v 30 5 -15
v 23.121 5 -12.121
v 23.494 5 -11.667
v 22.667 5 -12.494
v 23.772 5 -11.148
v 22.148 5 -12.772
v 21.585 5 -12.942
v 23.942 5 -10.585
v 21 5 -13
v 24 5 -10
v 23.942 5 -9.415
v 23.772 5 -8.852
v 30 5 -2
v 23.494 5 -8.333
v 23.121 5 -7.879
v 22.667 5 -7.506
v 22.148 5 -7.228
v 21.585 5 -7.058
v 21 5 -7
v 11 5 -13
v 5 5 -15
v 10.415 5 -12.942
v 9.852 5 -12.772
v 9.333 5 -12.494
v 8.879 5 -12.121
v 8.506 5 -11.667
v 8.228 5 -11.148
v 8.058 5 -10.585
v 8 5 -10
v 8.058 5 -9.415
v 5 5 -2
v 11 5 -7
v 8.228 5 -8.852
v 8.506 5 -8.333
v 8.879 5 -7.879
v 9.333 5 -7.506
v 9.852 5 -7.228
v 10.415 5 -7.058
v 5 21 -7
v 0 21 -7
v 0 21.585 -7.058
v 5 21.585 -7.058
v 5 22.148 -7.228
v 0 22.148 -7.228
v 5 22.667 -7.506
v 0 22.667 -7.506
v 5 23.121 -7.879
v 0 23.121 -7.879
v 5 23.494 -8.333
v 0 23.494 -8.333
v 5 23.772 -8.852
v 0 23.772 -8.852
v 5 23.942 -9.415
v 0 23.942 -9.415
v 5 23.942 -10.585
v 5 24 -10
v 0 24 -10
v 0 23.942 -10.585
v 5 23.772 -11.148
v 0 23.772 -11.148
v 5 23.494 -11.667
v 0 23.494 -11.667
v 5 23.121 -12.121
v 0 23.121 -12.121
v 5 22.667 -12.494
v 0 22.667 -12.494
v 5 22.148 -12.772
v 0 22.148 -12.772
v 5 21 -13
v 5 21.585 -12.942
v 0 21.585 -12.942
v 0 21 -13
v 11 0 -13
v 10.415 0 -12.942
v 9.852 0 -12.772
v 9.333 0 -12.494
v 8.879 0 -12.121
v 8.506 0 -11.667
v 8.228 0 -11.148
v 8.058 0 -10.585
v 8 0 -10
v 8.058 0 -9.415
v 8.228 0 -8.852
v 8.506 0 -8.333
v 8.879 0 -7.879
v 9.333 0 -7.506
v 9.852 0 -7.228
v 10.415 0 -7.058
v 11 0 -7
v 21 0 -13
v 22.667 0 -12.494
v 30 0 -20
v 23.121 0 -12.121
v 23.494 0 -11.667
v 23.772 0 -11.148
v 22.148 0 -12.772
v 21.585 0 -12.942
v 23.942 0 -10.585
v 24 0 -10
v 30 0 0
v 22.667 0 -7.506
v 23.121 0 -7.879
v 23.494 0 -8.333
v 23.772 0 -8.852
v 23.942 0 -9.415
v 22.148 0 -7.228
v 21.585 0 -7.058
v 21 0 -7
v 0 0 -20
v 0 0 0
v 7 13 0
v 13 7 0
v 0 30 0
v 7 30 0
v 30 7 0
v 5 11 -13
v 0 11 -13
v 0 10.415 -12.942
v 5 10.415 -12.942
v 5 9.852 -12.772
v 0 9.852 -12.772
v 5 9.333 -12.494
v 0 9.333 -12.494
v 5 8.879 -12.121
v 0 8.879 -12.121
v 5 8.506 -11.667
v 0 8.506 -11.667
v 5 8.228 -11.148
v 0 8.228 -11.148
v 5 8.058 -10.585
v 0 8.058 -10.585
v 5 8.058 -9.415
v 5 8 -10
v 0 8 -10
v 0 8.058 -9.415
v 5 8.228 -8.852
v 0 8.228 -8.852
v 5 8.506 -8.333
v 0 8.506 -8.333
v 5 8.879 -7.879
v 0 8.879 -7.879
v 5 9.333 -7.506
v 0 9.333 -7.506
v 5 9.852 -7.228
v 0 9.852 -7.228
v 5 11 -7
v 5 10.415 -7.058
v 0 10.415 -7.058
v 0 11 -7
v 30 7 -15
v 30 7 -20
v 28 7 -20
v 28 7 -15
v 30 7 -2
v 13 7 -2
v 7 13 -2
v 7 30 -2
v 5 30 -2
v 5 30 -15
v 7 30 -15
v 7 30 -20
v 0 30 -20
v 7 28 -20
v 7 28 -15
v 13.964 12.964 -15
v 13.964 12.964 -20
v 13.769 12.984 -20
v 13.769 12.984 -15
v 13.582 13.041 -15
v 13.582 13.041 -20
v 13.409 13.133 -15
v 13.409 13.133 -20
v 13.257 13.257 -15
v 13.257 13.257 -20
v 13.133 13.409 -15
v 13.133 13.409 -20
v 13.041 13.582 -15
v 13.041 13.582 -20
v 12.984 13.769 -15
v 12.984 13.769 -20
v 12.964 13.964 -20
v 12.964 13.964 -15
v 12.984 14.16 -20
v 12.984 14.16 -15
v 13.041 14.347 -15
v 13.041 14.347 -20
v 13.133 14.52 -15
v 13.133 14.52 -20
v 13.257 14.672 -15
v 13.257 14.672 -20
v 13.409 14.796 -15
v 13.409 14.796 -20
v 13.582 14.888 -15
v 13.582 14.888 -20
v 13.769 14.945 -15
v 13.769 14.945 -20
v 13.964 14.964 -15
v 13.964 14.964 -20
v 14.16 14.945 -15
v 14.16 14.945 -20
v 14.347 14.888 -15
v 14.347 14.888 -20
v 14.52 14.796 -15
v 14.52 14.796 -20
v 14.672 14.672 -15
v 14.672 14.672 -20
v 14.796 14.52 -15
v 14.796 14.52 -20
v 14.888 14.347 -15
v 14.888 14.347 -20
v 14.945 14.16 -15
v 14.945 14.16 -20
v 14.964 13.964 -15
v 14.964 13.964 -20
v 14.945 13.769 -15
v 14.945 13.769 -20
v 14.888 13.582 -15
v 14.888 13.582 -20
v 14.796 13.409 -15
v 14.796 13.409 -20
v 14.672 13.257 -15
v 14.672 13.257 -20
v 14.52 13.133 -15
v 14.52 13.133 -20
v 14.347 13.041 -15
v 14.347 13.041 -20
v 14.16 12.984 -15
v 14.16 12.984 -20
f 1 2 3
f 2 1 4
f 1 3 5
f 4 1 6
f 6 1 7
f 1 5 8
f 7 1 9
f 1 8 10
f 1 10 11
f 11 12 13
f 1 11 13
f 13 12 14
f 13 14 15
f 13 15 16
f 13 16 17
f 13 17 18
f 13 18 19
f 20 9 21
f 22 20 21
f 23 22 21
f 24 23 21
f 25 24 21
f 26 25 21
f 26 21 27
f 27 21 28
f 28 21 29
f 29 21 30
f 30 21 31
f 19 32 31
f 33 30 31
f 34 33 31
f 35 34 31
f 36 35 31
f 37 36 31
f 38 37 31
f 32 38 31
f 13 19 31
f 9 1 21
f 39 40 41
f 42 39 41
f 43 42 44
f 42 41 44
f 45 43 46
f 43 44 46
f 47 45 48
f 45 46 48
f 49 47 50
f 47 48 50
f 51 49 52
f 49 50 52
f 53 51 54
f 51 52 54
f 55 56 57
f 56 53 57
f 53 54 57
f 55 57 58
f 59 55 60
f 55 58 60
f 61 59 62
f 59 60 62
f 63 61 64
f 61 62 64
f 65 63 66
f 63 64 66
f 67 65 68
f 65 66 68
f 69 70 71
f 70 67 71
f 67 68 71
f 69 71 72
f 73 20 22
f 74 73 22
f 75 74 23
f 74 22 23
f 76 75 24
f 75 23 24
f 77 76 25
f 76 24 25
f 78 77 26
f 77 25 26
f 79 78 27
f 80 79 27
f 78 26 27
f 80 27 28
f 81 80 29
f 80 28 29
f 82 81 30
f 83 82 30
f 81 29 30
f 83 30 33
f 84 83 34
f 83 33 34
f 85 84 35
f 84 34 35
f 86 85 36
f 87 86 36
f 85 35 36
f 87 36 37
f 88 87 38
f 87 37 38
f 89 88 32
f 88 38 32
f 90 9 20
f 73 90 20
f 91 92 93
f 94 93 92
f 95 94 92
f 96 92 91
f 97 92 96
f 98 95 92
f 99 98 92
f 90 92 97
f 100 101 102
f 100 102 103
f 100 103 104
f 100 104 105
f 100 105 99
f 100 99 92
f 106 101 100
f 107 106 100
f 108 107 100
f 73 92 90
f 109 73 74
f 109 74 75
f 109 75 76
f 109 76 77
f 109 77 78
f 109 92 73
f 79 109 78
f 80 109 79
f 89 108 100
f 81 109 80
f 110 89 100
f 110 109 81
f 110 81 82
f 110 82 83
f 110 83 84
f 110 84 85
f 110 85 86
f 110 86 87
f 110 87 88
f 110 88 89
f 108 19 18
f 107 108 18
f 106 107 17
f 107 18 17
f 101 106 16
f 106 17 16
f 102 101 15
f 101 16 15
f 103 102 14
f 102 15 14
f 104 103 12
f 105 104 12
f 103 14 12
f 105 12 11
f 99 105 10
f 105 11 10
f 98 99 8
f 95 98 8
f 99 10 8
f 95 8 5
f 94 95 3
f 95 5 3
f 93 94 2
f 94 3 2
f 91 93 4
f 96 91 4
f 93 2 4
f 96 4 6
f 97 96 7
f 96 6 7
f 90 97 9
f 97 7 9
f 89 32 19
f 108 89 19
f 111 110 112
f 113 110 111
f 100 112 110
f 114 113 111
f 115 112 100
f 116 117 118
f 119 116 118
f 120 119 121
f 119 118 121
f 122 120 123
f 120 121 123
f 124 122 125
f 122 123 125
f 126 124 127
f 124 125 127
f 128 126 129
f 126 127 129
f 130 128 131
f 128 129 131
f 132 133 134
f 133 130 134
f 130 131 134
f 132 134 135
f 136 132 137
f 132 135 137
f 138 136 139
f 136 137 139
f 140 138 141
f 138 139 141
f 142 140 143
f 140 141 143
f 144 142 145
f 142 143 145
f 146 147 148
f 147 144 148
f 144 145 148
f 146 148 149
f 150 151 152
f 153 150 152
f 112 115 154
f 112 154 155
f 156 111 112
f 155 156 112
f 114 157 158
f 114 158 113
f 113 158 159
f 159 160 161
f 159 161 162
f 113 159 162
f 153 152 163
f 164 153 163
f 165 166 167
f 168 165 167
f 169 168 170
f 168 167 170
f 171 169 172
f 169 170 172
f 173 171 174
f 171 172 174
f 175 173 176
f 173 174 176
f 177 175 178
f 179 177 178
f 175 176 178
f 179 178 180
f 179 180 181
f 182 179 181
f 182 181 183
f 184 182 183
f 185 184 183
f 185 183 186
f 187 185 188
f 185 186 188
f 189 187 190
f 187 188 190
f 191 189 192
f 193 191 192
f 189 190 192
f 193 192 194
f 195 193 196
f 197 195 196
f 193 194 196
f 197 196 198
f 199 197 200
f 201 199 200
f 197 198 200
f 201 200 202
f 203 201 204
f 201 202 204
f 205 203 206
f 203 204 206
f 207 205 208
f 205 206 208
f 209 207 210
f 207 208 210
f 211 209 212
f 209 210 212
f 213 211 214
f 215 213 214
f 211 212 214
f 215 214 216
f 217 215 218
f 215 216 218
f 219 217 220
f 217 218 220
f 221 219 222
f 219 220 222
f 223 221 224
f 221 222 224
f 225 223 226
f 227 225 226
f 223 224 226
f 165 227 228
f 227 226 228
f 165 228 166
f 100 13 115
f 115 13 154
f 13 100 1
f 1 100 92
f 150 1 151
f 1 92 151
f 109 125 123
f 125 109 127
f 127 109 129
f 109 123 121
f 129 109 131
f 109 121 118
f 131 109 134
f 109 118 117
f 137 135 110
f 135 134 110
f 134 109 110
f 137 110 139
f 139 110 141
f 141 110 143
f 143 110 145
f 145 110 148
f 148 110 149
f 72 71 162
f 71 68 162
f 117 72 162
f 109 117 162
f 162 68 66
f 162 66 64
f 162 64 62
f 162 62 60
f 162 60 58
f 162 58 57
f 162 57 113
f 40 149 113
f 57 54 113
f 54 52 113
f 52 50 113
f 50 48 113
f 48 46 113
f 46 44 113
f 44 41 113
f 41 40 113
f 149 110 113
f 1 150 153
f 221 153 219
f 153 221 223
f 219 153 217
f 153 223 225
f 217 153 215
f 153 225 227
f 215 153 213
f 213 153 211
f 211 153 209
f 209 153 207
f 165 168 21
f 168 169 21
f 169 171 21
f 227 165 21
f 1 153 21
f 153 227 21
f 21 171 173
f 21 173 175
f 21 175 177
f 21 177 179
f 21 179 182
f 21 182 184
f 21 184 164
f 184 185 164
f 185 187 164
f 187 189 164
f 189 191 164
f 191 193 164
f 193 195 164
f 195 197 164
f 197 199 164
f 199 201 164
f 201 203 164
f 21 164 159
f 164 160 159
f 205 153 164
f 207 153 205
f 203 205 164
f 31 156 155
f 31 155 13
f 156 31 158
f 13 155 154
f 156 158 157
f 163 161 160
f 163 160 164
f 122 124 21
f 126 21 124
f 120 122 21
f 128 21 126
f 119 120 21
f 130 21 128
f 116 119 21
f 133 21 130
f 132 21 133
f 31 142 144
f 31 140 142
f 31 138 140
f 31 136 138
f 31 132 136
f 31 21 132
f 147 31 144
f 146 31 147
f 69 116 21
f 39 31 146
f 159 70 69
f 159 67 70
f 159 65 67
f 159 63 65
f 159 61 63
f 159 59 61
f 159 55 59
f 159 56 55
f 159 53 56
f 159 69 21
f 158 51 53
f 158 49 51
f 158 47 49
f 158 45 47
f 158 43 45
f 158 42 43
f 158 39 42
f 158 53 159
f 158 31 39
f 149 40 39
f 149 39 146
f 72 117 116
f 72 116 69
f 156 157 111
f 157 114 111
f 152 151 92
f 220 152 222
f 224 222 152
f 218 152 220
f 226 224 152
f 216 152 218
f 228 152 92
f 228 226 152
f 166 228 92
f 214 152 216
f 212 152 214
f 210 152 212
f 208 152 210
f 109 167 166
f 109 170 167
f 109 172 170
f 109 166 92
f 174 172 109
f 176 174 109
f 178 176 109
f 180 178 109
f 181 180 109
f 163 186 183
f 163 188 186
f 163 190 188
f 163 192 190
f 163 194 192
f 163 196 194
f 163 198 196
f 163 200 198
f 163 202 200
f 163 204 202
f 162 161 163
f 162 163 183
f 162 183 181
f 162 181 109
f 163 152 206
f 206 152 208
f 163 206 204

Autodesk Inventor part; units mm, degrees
ref_plane "YZ Plane" through (0, 0, 0) normal (1, 0, 0) x (0, 1, 0)
ref_plane "XZ Plane" through (0, 0, 0) normal (0, 1, 0) x (-1, 0, 0)
ref_plane "XY Plane" through (0, 0, 0) normal (0, 0, 1) x (1, 0, 0)
sketch "Boceto1" plane through (0, 0, 0) normal (1, 0, 0) x (0, 1, 0)
  line L0 (0, 0) -> (30, 0)
  line L1 (30, 0) -> (30, -20)
  line L2 (30, -20) -> (0, -20)
  line L3 (0, -20) -> (0, 0)
  line L4 (21, -10) -> (11, -10) construction
  line L5 (21, -7) -> (11, -7)
  line L6 (11, -13) -> (21, -13)
  arc A0 (21, -13) -> (21, -7) centre (21, -10) ccw
  arc A1 (11, -7) -> (11, -13) centre (11, -10) ccw
  point P0 (16, -10)
  point P1 (24, -10)
  point P2 (30, -10)
  point P3 (0, -10)
  point P4 (8, -10)
  dimension "d0" = 30
  dimension "d1" = 20
  dimension "d2" = 10
  dimension "d3" = 6
  dimension "d4" = 6
extrude "Extrusión1" add sketch "Boceto1" along normal blind 5
sketch "Boceto2" plane through (5, 0, 0) normal (1, 0, 0) x (0, 0, -1)
  line L0 (0, 0) -> (20, 0) projected
  line L1 (0, 0) -> (20, 0)
  line L2 (20, 0) -> (20, 5)
  line L3 (20, 5) -> (0, 5)
  line L4 (0, 5) -> (0, 0)
  dimension "d8" = 20
  dimension "d9" = 5
extrude "Extrusión2" add sketch "Boceto2" along normal blind 25
sketch "Boceto3" plane through (5, 5, 0) normal (0, 1, 0) x (1, 0, 0)
  line L0 (6, 10) -> (16, 10) construction
  line L1 (6, 7) -> (16, 7)
  line L2 (16, 13) -> (6, 13)
  arc A0 (6, 13) -> (6, 7) centre (6, 10) ccw
  arc A1 (16, 7) -> (16, 13) centre (16, 10) ccw
  line L3 (25, 20) -> (25, 0) projected
  line L4 (0, 0) -> (25, 0) projected
  point P0 (-5, 0)
  point P1 (11, 10)
  point P2 (25, 10)
  point P3 (19, 10)
  dimension "d12" = 10
  dimension "d13" = 6
  dimension "d14" = 6
  dimension "d15" = 10
extrude "Extrusión3" cut sketch "Boceto3" against normal blind 5
sketch "Boceto4" plane through (0, 0, 0) normal (0, 0, 1) x (1, 0, 0)
  line L0 (5, 30) -> (5, 5) projected
  line L1 (5, 5) -> (30, 5) projected
  line L2 (5, 5) -> (5, 28)
  line L3 (5, 30) -> (7, 30)
  line L4 (7, 30) -> (7, 28)
  line L5 (30, 5) -> (30, 7)
  line L6 (30, 7) -> (28, 7)
  line L7 (28, 7) -> (7, 28)
  point P0 (0, 0)
  point P1 (28, 5)
  dimension "d18" = 2
  dimension "d19" = 2
  dimension "d22" = 2
extrude "Extrusión4" add sketch "Boceto4" against normal blind 2
sketch "Boceto5" plane through (0, 0, -20) normal (0, 0, -1) x (-1, 0, 0)
  line L0 (-30, 0) -> (-30, 5) projected
  line L1 (-30, 0) -> (-30, 7) projected
  line L2 (-30, 5) -> (-30, 7)
  line L3 (-30, 7) -> (-28, 7)
  line L4 (-7, 30) -> (-7, 28) projected
  line L5 (-28, 7) -> (-7, 28)
  line L6 (-7, 28) -> (-7, 30)
  line L7 (-7, 30) -> (-5, 30)
  line L8 (-5, 30) -> (-5, 5)
  line L9 (-5, 5) -> (-30, 5)
  point P0 (0, 0)
  dimension "d23" = 2
extrude "Extrusión5" add sketch "Boceto5" against normal blind 5
sketch "Boceto6" plane through (0, 0, 0) normal (0, 0, 1) x (1, 0, 0)
  line L0 (28, 7) -> (7, 28) projected
  line L1 (7, 28) -> (7, 13)
  line L2 (7, 13) -> (13, 7)
  line L3 (13, 7) -> (28, 7)
  point P0 (0, 0)
  dimension "d26" = 45
  dimension "d27" = 15
extrude "Extrusión6" cut sketch "Boceto6" against normal blind 2
sketch "Boceto7" plane through (0, 0, -15) normal (0, 0, 1) x (1, 0, 0)
  line L0 (7, 28) -> (28, 7) projected
  line L1 (7, 28) -> (7, 7)
  line L2 (7, 7) -> (28, 7)
  line L3 (7, 7) -> (17.5, 17.5)
  line L4 (28, 7) -> (7, 28) projected
  point P0 (0, 0)
  point P1 (13.9645, 13.9645)
  point P2 (17.5, 17.5)
  dimension "d30" = 5
hole "Agujero1" at (13.9645, 13.9645, -15) direction (0, 0, -1) diameter 2 end through all
properties part number "Esquinero"
